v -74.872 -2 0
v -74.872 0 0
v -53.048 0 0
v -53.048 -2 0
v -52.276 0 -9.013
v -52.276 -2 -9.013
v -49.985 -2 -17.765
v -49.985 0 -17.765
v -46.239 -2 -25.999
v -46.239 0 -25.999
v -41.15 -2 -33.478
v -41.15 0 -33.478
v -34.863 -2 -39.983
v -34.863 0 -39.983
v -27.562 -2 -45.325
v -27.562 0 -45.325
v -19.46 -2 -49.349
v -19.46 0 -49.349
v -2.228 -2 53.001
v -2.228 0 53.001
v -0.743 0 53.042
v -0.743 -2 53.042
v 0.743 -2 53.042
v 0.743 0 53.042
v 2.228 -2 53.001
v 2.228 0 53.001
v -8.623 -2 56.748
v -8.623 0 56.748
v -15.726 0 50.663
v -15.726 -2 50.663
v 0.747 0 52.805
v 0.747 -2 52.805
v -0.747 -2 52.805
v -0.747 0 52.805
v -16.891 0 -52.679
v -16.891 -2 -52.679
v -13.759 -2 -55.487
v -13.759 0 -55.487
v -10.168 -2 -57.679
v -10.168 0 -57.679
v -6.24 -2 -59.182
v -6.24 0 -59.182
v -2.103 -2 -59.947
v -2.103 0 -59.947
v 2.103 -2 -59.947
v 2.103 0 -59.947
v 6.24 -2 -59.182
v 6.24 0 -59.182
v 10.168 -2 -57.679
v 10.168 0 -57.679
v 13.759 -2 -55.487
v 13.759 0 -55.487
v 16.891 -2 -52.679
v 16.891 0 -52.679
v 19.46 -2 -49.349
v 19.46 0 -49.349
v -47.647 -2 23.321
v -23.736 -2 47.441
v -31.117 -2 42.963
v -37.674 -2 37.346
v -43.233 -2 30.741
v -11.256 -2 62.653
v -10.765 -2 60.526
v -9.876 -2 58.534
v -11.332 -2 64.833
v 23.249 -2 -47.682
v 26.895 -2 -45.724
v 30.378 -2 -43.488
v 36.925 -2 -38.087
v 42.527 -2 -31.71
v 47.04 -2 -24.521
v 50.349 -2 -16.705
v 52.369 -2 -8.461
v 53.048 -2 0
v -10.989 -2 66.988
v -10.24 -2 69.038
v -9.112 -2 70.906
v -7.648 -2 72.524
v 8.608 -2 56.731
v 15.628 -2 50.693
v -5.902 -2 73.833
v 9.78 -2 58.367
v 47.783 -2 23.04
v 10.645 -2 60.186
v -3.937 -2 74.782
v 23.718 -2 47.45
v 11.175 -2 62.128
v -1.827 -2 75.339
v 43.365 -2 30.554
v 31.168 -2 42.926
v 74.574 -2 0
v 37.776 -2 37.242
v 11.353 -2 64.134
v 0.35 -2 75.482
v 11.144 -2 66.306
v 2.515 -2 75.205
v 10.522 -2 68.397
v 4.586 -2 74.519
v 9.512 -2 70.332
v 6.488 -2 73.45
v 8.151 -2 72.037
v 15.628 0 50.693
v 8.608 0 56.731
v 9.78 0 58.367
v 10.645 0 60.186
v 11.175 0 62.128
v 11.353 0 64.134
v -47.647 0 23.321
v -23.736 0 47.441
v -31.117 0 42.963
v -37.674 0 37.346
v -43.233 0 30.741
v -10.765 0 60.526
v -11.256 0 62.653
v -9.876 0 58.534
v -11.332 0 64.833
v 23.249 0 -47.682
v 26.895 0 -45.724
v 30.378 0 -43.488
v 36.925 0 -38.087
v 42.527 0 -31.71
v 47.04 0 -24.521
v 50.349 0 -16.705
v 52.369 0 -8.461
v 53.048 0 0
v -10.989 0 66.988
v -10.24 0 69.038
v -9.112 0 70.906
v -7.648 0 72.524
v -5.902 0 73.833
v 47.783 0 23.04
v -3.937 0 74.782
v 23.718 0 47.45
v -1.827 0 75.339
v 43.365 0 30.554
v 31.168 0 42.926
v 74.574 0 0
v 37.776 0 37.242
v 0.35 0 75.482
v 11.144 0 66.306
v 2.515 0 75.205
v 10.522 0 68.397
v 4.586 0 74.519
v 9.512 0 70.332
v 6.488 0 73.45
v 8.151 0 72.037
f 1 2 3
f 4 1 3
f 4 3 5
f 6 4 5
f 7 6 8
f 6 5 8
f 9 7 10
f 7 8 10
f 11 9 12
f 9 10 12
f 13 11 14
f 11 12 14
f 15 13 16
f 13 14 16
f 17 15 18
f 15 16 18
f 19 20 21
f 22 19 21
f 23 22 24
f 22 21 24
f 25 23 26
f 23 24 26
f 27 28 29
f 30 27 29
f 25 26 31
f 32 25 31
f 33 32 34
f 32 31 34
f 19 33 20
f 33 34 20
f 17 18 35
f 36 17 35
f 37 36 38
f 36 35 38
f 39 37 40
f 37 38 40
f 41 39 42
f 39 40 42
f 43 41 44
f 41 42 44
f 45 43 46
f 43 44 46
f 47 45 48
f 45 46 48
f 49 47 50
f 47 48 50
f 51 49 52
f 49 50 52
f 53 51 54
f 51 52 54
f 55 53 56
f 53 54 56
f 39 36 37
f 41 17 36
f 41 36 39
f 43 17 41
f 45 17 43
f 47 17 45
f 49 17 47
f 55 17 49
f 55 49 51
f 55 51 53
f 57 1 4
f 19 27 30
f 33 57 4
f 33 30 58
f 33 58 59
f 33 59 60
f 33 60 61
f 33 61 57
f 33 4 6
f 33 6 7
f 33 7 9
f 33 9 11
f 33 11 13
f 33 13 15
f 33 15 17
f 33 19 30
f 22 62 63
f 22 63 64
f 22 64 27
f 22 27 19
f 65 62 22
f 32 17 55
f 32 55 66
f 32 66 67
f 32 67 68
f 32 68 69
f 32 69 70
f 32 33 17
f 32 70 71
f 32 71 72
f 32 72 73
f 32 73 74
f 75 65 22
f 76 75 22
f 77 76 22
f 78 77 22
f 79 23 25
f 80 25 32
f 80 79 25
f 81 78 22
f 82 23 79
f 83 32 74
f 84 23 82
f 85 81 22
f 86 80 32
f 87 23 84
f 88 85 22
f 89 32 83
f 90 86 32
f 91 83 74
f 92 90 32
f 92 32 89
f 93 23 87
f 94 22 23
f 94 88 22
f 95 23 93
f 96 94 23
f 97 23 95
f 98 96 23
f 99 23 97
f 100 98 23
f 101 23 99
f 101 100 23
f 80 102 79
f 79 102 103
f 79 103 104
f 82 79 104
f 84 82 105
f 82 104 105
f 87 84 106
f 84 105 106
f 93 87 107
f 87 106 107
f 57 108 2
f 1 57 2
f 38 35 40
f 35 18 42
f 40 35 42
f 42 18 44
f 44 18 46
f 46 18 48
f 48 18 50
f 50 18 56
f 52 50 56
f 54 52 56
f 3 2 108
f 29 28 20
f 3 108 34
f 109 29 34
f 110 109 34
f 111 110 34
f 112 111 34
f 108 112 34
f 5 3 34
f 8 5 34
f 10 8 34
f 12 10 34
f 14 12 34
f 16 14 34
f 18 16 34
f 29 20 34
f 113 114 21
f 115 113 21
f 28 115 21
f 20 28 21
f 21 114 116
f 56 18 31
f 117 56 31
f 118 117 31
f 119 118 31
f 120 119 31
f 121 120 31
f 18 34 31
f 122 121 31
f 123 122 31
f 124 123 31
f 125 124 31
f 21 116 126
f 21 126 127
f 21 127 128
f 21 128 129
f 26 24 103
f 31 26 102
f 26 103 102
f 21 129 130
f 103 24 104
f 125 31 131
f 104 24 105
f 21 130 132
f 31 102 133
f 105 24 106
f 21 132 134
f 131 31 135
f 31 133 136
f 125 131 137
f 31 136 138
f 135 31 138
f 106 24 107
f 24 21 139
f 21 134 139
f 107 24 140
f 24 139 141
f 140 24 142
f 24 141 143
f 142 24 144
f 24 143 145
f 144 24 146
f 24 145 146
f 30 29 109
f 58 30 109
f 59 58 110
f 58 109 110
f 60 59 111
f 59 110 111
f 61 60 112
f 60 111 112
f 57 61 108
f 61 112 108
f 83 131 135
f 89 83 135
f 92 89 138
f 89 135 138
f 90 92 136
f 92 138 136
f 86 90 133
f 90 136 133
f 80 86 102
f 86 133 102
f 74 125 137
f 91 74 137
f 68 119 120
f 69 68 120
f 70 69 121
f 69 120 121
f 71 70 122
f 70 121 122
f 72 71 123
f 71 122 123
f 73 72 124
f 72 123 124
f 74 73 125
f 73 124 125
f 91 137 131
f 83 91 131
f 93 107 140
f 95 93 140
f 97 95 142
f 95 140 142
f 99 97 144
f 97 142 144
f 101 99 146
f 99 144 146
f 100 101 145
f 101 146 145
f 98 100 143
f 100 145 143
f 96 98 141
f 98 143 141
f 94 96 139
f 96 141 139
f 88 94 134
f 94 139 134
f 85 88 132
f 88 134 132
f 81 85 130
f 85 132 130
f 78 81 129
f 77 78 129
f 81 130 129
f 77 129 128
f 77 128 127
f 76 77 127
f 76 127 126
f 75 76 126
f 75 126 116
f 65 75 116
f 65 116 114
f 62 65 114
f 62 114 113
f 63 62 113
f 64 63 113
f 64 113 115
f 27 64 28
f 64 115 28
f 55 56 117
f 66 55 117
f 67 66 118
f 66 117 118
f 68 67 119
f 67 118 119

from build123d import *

# Parameters (mm, degrees)
F1_DEPTH = 2


# Not quite as in the source:
# - a feature names something its author has since deleted; it is built from what else it names


with BuildPart() as f1:
    # F0 (on Front) → F1 (new body)
    with BuildSketch(Plane.XZ):
        with BuildLine():
            ThreePointArc((19.4604751144, -49.3491610835), (25.0909627965, -46.7385641336), (30.3780152375, -43.4882280802))
            ThreePointArc((30.3780152375, -43.4882280802), (47.0400422182, -24.5210974354), (53.0476181494, 0))
            Line((53.0476181494, 0), (-53.0476181494, 0))
            ThreePointArc((-53.0476181494, 0), (-43.8541995948, -29.8472606654), (-19.4604751144, -49.3491610835))
            ThreePointArc((-19.4604751144, -49.3491610835), (-6.4361640705, -14.8511496358), (23.054123582, -36.9886383414))
            ThreePointArc((23.054123582, -36.9886383414), (22.1374887057, -43.4248024119), (19.4604751144, -49.3491610835))
        make_face()
        with BuildLine():
            Line((-53.0476181494, 0), (53.0476181494, 0))
            ThreePointArc((53.0476181494, 0), (51.7146557328, 11.817113597), (47.7827569309, 23.0403544115))
            Line((47.7827569309, 23.0403544115), (15.6281781272, 50.6932918615))
            ThreePointArc((15.6281781272, 50.6932918615), (9.002371997, 52.2781702984), (2.2280864718, 53.0008058618))
            ThreePointArc((2.2280864718, 53.0008058618), (0, 52.7800319348), (-2.2280864718, 53.0008058618))
            ThreePointArc((-2.2280864718, 53.0008058618), (-9.0528372764, 52.2694550246), (-15.7260278086, 50.6630224196))
            Line((-15.7260278086, 50.6630224196), (-47.6465335474, 23.3207553961))
            ThreePointArc((-47.6465335474, 23.3207553961), (-51.6797102792, 11.9690156981), (-53.0476181494, 0))
        make_face()
        with BuildLine():
            ThreePointArc((47.7827569309, 23.0403544115), (51.7146557328, 11.817113597), (53.0476181494, 0))
            Line((53.0476181494, 0), (74.573867023, 0))
            Line((74.573867023, 0), (47.7827569309, 23.0403544115))
        make_face()
        with BuildLine():
            ThreePointArc((-19.4604751144, -49.3491610835), (0, -60.0427619235), (19.4604751144, -49.3491610835))
            ThreePointArc((19.4604751144, -49.3491610835), (0, -53.0476181494), (-19.4604751144, -49.3491610835))
        make_face()
        with BuildLine():
            ThreePointArc((-19.4604751144, -49.3491610835), (0, -53.0476181494), (19.4604751144, -49.3491610835))
            ThreePointArc((19.4604751144, -49.3491610835), (22.1374887057, -43.4248024119), (23.054123582, -36.9886383414))
            ThreePointArc((23.054123582, -36.9886383414), (-6.4361640705, -14.8511496358), (-19.4604751144, -49.3491610835))
        make_face()
        with BuildLine():
            Line((15.6281781272, 50.6932918615), (47.7827569309, 23.0403544115))
            ThreePointArc((47.7827569309, 23.0403544115), (34.5891299202, 40.2199189791), (15.6281781272, 50.6932918615))
        make_face()
        with BuildLine():
            Line((-74.8721584678, 0), (-53.0476181494, 0))
            ThreePointArc((-53.0476181494, 0), (-51.6797102792, 11.9690156981), (-47.6465335474, 23.3207553961))
            Line((-47.6465335474, 23.3207553961), (-74.8721584678, 0))
        make_face()
        with BuildLine():
            ThreePointArc((2.2280864718, 53.0008058618), (9.002371997, 52.2781702984), (15.6281781272, 50.6932918615))
            Line((15.6281781272, 50.6932918615), (8.6080503312, 56.7306016959))
            ThreePointArc((8.6080503312, 56.7306016959), (5.730035728, 54.3320712807), (2.2280864718, 53.0008058618))
        make_face()
        with BuildLine():
            ThreePointArc((-15.7260278086, 50.6630224196), (-34.5097127589, 40.2880815704), (-47.6465335474, 23.3207553961))
            Line((-47.6465335474, 23.3207553961), (-15.7260278086, 50.6630224196))
        make_face()
        with BuildLine():
            ThreePointArc((-2.2280864718, 53.0008058618), (0, 53.0476181494), (2.2280864718, 53.0008058618))
            ThreePointArc((2.2280864718, 53.0008058618), (5.730035728, 54.3320712807), (8.6080503312, 56.7306016959))
            Line((8.6080503312, 56.7306016959), (0, 64.1335248947))
            Line((0, 64.1335248947), (-8.6226387996, 56.7475989187))
            ThreePointArc((-8.6226387996, 56.7475989187), (-5.7397015847, 54.3377284437), (-2.2280864718, 53.0008058618))
        make_face()
        with BuildLine():
            Line((0, 64.1335248947), (8.6080503312, 56.7306016959))
            ThreePointArc((8.6080503312, 56.7306016959), (10.6450279761, 60.1857176833), (11.3534929599, 64.1335248947))
            ThreePointArc((11.3534929599, 64.1335248947), (-3.9373045021, 74.7824420063), (-8.6226387996, 56.7475989187))
            Line((-8.6226387996, 56.7475989187), (0, 64.1335248947))
        make_face()
        with BuildLine():
            Line((-8.6226387996, 56.7475989187), (-15.7260278086, 50.6630224196))
            ThreePointArc((-15.7260278086, 50.6630224196), (-9.0528372764, 52.2694550246), (-2.2280864718, 53.0008058618))
            ThreePointArc((-2.2280864718, 53.0008058618), (-5.7397015847, 54.3377284437), (-8.6226387996, 56.7475989187))
        make_face()
    extrude(amount=F1_DEPTH)


solid = f1.part
